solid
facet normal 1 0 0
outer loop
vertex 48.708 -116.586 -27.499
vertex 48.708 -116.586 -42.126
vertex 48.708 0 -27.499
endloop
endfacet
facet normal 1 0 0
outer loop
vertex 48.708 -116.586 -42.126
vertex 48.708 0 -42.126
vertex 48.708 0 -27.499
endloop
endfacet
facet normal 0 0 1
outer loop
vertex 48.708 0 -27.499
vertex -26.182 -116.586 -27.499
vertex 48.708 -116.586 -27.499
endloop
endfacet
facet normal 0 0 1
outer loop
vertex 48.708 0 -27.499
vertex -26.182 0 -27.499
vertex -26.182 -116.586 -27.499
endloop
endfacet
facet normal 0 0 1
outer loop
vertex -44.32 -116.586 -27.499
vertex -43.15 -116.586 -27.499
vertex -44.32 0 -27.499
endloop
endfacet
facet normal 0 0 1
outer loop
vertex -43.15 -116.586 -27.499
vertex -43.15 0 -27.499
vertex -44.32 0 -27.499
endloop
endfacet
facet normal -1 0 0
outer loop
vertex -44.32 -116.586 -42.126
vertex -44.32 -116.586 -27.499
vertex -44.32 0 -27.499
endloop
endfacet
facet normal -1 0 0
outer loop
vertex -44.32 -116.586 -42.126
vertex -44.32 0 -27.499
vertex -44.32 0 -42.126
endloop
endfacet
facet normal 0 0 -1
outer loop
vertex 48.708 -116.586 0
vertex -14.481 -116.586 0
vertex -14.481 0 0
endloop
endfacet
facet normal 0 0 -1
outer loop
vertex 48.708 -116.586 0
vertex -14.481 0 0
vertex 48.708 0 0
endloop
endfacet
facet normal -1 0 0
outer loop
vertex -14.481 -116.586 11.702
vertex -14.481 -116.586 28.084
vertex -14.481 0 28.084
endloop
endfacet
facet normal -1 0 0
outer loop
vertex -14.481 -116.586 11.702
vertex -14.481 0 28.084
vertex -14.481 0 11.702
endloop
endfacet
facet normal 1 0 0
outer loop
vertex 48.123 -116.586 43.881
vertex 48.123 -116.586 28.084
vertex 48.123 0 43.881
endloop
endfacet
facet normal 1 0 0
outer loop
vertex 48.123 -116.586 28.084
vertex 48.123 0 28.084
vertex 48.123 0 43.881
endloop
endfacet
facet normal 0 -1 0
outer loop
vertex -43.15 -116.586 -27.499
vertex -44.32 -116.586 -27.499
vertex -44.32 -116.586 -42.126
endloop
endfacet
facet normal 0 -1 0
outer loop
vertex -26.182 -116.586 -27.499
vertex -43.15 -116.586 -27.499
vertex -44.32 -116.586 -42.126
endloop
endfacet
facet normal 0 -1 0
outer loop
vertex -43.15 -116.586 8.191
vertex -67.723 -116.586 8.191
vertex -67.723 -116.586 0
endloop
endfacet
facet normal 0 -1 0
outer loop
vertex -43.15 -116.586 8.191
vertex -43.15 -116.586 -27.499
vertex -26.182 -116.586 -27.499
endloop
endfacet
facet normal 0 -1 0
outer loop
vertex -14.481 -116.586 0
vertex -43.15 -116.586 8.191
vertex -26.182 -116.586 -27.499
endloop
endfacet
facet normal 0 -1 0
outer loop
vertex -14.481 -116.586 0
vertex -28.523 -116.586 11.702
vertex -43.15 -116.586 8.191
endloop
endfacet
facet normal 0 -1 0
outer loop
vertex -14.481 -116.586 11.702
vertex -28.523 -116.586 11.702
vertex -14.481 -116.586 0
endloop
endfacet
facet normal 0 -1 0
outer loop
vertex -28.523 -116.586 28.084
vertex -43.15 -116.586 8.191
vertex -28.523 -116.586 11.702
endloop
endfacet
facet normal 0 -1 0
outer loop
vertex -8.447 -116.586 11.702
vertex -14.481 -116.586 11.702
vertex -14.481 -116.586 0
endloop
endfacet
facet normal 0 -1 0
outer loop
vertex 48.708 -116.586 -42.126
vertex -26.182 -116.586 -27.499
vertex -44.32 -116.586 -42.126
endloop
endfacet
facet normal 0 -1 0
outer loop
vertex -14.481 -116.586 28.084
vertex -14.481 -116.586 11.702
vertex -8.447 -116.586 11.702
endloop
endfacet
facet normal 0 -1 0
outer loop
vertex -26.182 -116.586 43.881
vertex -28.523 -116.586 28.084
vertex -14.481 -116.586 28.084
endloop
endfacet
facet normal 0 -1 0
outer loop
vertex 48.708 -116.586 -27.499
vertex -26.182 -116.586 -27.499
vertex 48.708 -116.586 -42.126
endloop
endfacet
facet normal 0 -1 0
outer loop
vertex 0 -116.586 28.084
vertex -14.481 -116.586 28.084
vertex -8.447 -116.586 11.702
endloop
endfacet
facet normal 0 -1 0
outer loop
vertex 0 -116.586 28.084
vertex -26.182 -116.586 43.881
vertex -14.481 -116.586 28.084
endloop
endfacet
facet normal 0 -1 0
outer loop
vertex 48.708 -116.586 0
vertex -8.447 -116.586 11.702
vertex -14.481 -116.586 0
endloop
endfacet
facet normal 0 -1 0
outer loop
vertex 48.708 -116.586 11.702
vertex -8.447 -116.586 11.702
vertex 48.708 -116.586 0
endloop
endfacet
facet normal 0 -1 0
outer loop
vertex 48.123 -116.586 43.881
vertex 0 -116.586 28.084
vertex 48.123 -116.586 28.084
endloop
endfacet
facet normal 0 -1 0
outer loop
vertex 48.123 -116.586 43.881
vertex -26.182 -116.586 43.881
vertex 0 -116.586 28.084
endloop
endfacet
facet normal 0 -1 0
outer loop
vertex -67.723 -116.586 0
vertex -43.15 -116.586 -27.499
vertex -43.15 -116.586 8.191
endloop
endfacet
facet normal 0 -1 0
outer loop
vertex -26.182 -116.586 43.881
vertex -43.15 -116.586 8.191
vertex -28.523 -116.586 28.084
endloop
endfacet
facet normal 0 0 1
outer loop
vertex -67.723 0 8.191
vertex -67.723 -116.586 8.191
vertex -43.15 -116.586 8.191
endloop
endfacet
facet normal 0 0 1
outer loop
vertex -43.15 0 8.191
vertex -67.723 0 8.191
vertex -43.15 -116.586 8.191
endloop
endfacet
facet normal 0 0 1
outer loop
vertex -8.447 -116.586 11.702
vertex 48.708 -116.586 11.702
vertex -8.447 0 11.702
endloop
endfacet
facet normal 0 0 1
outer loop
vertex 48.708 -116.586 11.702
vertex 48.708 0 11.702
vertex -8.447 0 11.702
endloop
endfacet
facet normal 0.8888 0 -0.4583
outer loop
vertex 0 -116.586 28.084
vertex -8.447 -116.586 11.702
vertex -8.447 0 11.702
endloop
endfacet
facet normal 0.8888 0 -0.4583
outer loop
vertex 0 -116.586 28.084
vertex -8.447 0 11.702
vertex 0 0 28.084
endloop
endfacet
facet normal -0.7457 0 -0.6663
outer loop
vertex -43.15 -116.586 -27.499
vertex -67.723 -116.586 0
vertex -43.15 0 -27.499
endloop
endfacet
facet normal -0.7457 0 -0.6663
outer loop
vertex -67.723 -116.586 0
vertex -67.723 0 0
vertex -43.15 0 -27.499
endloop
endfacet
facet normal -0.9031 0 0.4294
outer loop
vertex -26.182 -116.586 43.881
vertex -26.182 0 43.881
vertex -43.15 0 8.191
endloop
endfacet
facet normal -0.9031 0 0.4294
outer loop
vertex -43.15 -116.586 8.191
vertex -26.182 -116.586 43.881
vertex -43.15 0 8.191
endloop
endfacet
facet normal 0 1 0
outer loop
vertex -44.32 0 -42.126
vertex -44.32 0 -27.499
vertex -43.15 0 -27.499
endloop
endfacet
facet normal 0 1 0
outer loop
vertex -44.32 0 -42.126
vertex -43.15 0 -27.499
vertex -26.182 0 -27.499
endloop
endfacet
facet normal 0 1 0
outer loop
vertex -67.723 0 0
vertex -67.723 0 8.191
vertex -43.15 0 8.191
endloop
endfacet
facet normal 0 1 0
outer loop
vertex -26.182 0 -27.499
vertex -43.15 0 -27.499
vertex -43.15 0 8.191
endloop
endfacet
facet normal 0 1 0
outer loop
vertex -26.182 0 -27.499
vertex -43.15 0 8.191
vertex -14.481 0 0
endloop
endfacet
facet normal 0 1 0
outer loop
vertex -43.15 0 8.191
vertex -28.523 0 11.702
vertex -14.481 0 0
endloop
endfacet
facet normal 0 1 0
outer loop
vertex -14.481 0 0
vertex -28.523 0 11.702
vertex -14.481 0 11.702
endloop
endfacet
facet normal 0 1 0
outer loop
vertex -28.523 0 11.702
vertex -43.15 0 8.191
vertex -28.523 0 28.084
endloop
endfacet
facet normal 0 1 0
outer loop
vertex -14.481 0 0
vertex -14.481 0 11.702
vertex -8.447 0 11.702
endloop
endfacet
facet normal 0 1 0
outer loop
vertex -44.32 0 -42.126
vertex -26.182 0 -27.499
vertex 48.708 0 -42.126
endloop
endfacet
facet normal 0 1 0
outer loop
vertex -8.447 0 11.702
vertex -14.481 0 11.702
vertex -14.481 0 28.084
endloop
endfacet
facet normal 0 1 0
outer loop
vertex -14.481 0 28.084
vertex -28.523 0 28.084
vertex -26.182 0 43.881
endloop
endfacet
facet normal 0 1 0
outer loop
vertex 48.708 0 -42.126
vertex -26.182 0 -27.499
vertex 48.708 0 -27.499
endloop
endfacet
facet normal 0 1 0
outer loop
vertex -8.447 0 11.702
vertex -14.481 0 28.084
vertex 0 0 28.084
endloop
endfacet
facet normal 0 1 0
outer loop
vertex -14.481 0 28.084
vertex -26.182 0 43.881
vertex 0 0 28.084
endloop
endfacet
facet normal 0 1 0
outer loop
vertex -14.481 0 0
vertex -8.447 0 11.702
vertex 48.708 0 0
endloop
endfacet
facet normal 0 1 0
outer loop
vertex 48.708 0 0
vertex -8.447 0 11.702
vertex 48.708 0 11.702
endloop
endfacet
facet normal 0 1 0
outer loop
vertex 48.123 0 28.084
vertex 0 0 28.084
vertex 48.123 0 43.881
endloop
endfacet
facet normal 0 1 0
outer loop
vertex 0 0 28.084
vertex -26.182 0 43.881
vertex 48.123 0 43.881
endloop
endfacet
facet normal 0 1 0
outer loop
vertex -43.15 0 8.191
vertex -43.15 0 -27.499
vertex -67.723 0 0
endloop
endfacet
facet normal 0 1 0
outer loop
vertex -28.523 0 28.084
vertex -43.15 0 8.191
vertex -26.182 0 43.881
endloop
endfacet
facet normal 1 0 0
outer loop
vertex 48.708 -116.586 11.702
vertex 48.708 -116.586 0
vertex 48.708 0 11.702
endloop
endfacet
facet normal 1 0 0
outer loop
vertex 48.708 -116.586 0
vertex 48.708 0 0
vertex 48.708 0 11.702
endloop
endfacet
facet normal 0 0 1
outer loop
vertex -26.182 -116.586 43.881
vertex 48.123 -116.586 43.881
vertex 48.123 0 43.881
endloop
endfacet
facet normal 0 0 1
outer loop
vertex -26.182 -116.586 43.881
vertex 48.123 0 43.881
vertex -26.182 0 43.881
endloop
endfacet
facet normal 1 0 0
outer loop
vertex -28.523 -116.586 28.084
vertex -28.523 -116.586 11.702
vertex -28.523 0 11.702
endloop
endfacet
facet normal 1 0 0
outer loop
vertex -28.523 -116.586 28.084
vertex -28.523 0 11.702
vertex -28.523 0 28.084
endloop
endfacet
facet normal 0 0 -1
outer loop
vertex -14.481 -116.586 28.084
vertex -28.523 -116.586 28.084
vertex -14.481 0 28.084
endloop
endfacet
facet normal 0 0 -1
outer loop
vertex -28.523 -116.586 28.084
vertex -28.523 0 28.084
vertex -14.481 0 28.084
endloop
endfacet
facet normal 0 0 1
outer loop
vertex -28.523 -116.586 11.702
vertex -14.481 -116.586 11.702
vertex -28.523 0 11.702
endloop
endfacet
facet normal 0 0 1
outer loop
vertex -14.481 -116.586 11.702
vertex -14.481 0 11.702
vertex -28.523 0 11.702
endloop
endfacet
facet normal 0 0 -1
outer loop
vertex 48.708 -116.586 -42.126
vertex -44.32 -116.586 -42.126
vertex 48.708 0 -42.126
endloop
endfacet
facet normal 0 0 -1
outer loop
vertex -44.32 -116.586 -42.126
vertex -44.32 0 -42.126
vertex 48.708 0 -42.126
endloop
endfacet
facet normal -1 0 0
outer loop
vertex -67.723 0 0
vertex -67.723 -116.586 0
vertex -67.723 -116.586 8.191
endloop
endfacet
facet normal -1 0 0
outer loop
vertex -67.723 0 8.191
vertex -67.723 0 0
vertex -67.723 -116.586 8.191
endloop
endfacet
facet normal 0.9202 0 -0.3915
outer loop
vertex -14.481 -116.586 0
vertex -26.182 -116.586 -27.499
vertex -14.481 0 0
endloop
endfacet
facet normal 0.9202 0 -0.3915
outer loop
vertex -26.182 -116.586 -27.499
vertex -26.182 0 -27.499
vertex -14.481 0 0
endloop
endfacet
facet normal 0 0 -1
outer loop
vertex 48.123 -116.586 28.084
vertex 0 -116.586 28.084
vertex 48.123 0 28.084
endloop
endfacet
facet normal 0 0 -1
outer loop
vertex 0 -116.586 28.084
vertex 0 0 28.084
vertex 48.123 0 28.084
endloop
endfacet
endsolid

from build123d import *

# Parameters (mm, degrees)
F0_W     = 24.573456496
F0_H     = 8.1911524758
F0_W_2   = 74.8905315995
F0_H_2   = 14.6270543337
F0_W_3   = 48.7080998719
F0_H_3   = 11.7016462609
F1_DEPTH = 25.4
F2_DEPTH = 91.186


with BuildPart() as f1:
    # F0 (on Front) → F1 (new body)
    with BuildSketch(Plane.XZ):
        with Locations((-55.436545983, 4.0955762379)):
            Rectangle(F0_W, F0_H)
        Polygon((-26.1824317276, 43.8811704516), (-43.149817735, 8.1911524758), (-43.149817735, 0), (-67.723274231, 0), (-43.149817735, -27.4988673627), (-26.1824317276, -27.4988673627), (-14.4807854667, 0), (-28.5227615386, 0), (-28.5227615386, 11.7016462609), (-28.5227615386, 28.0839502811), (-14.4807854667, 28.0839502811), (-14.4807854667, 11.7016462609), (-12.1404575184, 11.7016462609), (-8.4471246955, 11.7016462609), (0, 28.0839502811), (48.1230206788, 28.0839502811), (48.1230206788, 43.8811704516), align=None)
        Polygon((-26.1824317276, -27.4988673627), (-43.149817735, -27.4988673627), (-44.3199835718, -27.4988673627), (-44.3199835718, -42.1259216964), (-26.1824317276, -42.1259216964), align=None)
        with Locations((11.2628340721, -34.8123945296)):
            Rectangle(F0_W_2, F0_H_2)
        Polygon((-28.5227615386, 0), (-14.4807854667, 0), (-12.1404575184, 4.5388182771), (-12.1404575184, 11.7016462609), (-14.4807854667, 11.7016462609), (-28.5227615386, 11.7016462609), align=None)
        Polygon((-12.1404575184, 4.5388182771), (-14.4807854667, 0), (-12.1404575184, 0), align=None)
        Polygon((-12.1404575184, 11.7016462609), (-12.1404575184, 4.5388182771), (-8.4471246955, 11.7016462609), align=None)
        Polygon((-8.4471246955, 11.7016462609), (-12.1404575184, 4.5388182771), (-12.1404575184, 0), (0, 0), (0, 11.7016462609), align=None)
        with Locations((24.3540499359, 5.8508231305)):
            Rectangle(F0_W_3, F0_H_3)
    extrude(amount=F1_DEPTH)

    # F2 (add): a face of the model
    f2_faces = [f1.faces().sort_by_distance(p)[0] for p in [
        (-55.436545983, -25.4, 6.7436206186),
    ]]
    extrude(f2_faces, amount=F2_DEPTH)


solid = f1.part
